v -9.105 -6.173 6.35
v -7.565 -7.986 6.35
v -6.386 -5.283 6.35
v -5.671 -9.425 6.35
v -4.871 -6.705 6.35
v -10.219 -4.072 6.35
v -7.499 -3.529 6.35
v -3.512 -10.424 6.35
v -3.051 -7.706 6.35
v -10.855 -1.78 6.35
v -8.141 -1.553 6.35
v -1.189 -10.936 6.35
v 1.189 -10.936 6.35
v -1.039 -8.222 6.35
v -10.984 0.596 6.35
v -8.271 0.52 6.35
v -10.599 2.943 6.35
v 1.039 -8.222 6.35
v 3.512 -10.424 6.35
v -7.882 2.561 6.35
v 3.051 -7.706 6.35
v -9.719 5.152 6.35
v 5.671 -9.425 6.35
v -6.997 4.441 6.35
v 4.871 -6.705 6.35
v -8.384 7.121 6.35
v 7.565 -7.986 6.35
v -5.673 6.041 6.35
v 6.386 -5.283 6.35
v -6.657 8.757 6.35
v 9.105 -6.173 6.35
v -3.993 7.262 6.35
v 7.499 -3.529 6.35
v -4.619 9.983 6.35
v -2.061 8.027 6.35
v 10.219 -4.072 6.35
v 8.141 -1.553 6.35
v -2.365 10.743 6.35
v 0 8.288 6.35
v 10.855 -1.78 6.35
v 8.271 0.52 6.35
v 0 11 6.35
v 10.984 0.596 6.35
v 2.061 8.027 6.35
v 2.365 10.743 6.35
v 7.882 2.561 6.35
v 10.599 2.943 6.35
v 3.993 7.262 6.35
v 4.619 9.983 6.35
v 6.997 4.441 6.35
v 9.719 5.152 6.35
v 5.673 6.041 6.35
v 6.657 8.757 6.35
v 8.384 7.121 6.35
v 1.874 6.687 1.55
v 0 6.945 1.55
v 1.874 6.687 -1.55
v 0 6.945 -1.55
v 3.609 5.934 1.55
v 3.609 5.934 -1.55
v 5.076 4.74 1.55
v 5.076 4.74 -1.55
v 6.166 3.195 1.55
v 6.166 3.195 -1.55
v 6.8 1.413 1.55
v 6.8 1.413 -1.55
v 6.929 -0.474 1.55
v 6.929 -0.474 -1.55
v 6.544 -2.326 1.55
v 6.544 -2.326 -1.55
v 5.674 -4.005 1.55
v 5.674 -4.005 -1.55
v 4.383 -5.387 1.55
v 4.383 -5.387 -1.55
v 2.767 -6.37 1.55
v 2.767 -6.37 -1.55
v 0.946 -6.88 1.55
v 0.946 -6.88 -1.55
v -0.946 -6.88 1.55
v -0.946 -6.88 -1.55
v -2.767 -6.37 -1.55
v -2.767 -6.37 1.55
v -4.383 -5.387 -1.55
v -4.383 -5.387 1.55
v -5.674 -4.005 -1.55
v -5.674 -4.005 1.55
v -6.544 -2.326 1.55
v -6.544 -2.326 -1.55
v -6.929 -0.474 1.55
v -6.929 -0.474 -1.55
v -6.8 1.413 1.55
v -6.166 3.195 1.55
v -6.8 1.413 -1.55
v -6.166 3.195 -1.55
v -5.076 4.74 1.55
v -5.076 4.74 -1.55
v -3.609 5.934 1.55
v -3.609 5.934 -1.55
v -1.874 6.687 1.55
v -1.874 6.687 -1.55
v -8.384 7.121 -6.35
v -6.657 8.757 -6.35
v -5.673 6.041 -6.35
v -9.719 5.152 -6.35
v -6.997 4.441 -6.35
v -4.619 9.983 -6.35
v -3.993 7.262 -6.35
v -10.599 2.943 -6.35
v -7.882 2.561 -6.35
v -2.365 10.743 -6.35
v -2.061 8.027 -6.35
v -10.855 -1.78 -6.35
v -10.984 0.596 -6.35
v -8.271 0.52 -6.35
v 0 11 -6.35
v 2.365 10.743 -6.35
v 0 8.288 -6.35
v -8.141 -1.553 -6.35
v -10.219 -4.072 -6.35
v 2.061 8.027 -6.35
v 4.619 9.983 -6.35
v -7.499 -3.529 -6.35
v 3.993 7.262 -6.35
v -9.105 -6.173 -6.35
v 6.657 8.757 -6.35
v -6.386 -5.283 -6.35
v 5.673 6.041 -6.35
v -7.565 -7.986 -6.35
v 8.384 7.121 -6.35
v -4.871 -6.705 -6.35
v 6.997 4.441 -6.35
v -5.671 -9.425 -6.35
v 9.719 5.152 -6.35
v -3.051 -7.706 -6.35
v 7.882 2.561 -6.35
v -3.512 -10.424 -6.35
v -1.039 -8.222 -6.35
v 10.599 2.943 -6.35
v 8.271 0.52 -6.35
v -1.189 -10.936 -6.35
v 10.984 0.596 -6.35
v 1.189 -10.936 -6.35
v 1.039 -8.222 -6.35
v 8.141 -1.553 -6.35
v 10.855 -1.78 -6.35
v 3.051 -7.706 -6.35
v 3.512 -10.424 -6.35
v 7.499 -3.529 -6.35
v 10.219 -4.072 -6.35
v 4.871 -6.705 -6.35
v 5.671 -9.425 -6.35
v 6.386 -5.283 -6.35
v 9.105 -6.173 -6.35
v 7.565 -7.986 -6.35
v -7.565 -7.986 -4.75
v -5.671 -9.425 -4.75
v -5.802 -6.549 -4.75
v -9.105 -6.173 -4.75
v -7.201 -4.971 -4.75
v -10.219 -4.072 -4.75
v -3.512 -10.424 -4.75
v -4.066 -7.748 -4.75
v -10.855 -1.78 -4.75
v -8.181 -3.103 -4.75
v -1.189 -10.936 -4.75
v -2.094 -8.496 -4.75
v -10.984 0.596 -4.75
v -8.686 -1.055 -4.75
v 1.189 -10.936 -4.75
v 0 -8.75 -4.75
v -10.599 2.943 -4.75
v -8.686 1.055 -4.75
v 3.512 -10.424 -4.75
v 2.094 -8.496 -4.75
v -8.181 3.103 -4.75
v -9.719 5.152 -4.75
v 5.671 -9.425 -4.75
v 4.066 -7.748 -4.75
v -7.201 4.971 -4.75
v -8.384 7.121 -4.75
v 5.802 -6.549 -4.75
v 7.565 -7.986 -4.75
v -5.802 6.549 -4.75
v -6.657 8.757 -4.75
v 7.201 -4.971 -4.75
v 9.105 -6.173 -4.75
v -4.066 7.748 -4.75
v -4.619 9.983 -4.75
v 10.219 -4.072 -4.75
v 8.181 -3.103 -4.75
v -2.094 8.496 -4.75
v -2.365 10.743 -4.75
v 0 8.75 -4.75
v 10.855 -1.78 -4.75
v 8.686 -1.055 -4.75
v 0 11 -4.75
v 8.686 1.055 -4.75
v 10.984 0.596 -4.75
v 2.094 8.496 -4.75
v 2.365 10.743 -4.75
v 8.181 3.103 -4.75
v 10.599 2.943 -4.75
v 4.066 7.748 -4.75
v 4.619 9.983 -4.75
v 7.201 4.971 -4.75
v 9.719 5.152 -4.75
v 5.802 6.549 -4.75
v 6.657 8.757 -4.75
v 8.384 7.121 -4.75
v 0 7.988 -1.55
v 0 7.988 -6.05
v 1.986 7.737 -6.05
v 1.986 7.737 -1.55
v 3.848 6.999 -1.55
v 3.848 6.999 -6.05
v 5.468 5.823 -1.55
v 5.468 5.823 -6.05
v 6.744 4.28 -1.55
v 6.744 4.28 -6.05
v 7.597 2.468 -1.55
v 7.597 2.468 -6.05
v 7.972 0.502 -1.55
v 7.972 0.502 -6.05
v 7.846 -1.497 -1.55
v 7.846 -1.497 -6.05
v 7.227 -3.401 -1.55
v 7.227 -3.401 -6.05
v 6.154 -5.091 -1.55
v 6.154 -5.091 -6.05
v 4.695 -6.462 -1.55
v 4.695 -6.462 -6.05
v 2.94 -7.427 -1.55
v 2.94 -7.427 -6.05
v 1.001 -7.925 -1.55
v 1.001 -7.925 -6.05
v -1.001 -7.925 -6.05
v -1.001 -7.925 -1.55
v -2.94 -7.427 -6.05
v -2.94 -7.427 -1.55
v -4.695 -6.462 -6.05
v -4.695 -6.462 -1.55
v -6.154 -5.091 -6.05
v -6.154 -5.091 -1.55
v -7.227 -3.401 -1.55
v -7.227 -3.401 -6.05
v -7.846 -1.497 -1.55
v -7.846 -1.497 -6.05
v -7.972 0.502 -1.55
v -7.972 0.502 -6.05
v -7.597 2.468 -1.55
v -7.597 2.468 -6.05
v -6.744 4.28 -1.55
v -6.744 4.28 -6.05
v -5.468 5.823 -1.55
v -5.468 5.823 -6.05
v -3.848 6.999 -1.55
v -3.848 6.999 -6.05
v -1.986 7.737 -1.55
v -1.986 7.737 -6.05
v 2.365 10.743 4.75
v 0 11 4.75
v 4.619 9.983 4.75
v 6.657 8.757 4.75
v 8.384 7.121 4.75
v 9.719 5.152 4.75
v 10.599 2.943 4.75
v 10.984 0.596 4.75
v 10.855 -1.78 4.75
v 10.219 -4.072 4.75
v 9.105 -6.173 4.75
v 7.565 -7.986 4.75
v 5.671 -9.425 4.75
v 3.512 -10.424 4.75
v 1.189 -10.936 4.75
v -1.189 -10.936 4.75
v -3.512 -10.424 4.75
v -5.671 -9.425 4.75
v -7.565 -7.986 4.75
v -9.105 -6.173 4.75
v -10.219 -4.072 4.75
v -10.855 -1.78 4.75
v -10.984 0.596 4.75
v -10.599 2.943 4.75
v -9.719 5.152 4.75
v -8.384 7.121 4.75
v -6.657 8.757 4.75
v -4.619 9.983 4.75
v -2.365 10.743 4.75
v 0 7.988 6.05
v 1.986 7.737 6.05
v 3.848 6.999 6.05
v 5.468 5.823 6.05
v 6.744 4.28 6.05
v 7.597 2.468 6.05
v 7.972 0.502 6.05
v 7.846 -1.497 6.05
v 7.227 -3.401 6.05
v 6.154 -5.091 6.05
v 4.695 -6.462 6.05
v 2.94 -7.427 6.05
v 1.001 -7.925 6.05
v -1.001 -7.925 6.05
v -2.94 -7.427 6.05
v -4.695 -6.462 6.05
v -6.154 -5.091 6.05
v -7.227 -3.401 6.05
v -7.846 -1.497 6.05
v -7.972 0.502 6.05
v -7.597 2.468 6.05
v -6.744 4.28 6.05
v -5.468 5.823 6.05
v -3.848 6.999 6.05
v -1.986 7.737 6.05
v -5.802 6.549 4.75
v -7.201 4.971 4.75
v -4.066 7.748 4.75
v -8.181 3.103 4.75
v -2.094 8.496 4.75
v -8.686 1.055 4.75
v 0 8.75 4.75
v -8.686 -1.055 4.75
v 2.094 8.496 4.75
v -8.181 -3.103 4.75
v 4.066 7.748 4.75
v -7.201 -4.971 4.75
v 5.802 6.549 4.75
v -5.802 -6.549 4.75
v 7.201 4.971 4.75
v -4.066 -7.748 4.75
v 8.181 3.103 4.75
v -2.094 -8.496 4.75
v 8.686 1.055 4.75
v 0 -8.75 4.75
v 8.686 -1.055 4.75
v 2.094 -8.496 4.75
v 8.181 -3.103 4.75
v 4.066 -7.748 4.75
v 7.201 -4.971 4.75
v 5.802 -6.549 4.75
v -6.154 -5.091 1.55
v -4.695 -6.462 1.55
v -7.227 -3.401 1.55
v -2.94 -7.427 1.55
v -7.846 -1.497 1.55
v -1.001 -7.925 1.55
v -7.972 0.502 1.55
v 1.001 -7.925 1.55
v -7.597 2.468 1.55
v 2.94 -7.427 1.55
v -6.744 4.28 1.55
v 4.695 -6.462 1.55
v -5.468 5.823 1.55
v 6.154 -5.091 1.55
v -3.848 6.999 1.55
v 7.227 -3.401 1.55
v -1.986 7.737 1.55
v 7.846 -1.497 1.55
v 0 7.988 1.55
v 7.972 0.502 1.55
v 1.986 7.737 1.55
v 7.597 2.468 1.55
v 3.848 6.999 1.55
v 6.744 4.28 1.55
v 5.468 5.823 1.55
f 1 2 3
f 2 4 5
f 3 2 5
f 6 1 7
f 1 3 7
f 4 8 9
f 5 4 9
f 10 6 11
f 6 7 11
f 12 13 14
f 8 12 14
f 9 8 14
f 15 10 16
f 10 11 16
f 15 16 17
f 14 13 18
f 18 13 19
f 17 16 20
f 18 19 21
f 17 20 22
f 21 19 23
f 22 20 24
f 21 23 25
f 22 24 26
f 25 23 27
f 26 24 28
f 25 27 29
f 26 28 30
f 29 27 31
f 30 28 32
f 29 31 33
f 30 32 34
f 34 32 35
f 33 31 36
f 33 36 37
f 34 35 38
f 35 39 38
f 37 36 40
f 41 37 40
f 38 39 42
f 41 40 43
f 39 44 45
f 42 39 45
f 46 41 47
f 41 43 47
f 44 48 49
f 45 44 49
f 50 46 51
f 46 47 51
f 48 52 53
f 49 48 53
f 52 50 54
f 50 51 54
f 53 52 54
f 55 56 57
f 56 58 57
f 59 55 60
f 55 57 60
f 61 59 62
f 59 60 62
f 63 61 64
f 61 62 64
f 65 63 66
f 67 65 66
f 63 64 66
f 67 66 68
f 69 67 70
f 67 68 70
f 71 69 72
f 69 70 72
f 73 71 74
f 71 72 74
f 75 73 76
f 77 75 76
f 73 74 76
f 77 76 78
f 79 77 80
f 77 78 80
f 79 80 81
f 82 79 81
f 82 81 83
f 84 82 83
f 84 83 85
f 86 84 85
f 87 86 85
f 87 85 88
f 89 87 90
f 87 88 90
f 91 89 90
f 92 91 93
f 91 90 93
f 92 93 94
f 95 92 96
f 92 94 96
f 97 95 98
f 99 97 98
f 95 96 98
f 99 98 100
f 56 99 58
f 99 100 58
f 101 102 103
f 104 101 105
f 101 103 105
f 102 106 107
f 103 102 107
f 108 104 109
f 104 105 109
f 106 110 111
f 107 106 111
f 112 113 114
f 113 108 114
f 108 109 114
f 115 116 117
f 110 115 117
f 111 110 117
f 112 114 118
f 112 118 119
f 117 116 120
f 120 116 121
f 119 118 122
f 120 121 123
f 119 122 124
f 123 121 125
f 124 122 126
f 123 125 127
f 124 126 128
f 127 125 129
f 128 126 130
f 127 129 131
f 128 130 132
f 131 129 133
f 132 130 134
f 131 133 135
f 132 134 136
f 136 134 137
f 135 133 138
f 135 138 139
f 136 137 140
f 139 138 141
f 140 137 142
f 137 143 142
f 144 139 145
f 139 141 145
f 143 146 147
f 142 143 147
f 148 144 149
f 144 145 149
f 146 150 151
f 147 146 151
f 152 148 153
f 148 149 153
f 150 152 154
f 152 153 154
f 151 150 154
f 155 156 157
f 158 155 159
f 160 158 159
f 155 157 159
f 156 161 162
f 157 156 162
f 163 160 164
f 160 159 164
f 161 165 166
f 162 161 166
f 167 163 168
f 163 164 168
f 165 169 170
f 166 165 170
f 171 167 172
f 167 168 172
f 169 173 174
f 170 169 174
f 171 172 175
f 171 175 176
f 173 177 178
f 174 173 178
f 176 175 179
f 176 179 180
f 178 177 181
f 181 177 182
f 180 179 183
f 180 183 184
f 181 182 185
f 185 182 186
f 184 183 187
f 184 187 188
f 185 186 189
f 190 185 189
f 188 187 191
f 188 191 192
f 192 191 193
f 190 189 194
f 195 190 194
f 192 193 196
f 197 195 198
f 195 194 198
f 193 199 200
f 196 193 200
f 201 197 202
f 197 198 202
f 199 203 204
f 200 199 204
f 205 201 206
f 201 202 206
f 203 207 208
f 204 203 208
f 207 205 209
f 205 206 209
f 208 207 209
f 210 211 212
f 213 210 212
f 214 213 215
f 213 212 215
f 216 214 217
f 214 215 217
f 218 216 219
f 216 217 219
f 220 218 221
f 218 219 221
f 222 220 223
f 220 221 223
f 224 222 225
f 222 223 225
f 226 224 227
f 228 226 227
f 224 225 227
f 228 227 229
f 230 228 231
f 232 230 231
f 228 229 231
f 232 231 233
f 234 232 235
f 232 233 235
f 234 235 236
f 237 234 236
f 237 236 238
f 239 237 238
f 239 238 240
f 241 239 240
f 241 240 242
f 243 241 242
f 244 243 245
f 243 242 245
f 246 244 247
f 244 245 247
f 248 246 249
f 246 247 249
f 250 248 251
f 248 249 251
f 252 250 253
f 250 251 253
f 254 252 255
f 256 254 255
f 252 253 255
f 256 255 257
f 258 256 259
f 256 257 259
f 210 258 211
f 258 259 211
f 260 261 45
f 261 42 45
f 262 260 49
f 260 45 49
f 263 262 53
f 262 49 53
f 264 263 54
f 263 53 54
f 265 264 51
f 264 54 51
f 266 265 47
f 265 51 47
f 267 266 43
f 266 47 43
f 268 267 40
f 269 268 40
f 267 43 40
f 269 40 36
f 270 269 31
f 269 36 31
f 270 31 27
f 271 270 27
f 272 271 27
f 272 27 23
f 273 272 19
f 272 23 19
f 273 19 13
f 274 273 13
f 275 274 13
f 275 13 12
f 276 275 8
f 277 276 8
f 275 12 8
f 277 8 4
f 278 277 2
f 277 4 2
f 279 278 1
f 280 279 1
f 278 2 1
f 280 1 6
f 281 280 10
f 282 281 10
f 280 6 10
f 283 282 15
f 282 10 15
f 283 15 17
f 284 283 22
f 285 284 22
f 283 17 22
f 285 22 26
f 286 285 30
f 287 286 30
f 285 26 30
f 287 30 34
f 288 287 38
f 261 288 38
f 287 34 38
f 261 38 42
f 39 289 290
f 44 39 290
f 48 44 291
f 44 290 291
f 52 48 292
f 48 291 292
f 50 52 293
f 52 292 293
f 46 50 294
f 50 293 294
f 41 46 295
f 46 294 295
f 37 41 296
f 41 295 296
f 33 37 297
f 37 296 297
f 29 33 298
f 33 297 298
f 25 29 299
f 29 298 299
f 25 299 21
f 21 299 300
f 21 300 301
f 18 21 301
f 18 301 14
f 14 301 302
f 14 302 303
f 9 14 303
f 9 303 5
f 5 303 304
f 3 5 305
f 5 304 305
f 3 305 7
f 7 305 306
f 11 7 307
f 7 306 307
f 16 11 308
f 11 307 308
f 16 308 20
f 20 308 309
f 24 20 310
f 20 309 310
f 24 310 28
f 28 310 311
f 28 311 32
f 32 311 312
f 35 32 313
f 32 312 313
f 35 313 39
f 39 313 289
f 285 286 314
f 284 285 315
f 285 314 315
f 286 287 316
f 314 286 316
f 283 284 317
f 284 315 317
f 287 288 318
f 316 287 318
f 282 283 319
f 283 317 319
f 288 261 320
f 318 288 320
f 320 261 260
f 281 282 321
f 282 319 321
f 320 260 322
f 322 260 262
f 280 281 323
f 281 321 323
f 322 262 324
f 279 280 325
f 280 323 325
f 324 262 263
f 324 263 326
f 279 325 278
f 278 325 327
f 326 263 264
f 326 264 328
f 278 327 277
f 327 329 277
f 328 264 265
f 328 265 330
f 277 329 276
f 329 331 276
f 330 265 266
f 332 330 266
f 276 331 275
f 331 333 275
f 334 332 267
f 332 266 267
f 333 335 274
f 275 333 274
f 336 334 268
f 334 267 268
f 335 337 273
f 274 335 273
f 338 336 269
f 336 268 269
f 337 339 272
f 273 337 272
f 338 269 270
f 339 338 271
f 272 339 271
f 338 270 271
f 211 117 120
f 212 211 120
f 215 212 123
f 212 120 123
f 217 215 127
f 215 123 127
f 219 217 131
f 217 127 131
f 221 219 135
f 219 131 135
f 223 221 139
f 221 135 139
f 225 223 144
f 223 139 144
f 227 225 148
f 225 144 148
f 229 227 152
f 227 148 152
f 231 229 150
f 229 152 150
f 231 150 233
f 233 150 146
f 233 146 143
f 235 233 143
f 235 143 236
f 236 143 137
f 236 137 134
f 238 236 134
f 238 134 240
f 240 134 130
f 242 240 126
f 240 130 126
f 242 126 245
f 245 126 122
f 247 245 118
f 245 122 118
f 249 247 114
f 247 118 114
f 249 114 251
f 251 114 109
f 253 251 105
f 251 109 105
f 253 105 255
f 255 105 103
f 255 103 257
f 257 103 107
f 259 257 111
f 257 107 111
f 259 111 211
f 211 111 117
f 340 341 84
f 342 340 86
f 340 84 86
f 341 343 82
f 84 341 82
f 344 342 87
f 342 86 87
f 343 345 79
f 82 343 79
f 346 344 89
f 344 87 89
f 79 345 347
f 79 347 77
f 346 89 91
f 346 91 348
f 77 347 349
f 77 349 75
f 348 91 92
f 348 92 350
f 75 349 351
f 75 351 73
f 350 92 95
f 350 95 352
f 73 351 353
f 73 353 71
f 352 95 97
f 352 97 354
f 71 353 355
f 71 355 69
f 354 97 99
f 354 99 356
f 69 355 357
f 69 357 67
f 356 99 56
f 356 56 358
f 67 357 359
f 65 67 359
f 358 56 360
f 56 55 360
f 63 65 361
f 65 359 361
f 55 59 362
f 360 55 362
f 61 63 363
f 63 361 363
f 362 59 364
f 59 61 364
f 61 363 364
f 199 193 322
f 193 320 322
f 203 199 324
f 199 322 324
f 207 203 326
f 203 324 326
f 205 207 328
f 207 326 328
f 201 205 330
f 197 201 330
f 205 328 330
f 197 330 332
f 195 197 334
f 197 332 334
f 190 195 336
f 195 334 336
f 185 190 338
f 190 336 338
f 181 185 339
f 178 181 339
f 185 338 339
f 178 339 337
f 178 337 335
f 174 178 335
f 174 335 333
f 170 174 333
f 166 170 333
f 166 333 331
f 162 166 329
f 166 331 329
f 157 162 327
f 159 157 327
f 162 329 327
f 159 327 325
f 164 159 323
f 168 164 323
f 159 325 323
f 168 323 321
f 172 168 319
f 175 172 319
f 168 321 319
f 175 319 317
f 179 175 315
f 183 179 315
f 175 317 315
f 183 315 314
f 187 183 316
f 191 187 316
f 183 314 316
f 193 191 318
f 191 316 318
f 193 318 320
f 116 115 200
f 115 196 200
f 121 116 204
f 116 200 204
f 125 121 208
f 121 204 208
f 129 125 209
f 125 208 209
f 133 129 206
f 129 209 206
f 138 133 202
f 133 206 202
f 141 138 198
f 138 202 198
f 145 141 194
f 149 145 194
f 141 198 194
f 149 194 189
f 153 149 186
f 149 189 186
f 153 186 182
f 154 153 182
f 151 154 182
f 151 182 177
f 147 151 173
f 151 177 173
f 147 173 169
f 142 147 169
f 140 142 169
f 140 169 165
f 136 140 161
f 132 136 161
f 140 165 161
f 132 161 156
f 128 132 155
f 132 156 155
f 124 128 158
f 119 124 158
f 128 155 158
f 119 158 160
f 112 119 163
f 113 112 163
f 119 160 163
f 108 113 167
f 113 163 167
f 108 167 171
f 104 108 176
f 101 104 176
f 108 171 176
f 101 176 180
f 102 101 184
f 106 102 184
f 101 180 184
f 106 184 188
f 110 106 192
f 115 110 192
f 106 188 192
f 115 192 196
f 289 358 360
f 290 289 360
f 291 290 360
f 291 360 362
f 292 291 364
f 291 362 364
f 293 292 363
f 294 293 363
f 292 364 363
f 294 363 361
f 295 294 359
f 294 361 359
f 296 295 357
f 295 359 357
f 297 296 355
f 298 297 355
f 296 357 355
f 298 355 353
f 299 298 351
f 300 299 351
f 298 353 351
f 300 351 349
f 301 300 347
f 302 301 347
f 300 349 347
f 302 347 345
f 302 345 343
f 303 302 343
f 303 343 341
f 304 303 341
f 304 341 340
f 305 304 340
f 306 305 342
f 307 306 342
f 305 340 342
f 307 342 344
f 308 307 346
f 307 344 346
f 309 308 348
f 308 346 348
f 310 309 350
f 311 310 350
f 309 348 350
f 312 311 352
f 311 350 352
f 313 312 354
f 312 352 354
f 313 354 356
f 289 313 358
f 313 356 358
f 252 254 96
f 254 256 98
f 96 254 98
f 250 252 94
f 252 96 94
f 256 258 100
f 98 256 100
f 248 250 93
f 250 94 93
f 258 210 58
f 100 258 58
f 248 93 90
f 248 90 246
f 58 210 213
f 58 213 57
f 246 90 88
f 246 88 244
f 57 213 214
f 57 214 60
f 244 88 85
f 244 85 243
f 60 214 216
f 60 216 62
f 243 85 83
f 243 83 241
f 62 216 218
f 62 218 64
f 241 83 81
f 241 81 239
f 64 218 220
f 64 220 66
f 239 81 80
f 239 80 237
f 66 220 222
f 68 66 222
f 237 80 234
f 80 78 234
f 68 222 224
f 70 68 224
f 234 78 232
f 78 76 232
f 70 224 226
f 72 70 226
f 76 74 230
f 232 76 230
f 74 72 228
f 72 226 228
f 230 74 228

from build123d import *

# Parameters (mm, degrees)
CHAMFER1_SIZE = 0.3


with BuildPart() as part:
    # Sketch1 → Revolve1 (revolve)
    with BuildSketch(Plane(origin=(0, 0, 0), x_dir=(0, 0, -1), z_dir=(1, 0, 0))):
        Polygon((4.75, 8.75), (-4.75, 8.75), (-4.75, 11), (-6.35, 11), (-6.35, 7.9875), (-1.55, 7.9875), (-1.55, 6.945), (1.55, 6.945), (1.55, 7.9875), (6.35, 7.9875), (6.35, 11), (4.75, 11), align=None)
    revolve(axis=Axis((0, 0, 0), (0, 0, -1)))

    # Chamfer1
    chamfer1_edges = [part.edges().sort_by_distance(p)[0] for p in [
        (0, -7.9875, 6.35),
        (0, -7.9875, -6.35),
    ]]
    chamfer(chamfer1_edges, length=CHAMFER1_SIZE)


solid = part.part
